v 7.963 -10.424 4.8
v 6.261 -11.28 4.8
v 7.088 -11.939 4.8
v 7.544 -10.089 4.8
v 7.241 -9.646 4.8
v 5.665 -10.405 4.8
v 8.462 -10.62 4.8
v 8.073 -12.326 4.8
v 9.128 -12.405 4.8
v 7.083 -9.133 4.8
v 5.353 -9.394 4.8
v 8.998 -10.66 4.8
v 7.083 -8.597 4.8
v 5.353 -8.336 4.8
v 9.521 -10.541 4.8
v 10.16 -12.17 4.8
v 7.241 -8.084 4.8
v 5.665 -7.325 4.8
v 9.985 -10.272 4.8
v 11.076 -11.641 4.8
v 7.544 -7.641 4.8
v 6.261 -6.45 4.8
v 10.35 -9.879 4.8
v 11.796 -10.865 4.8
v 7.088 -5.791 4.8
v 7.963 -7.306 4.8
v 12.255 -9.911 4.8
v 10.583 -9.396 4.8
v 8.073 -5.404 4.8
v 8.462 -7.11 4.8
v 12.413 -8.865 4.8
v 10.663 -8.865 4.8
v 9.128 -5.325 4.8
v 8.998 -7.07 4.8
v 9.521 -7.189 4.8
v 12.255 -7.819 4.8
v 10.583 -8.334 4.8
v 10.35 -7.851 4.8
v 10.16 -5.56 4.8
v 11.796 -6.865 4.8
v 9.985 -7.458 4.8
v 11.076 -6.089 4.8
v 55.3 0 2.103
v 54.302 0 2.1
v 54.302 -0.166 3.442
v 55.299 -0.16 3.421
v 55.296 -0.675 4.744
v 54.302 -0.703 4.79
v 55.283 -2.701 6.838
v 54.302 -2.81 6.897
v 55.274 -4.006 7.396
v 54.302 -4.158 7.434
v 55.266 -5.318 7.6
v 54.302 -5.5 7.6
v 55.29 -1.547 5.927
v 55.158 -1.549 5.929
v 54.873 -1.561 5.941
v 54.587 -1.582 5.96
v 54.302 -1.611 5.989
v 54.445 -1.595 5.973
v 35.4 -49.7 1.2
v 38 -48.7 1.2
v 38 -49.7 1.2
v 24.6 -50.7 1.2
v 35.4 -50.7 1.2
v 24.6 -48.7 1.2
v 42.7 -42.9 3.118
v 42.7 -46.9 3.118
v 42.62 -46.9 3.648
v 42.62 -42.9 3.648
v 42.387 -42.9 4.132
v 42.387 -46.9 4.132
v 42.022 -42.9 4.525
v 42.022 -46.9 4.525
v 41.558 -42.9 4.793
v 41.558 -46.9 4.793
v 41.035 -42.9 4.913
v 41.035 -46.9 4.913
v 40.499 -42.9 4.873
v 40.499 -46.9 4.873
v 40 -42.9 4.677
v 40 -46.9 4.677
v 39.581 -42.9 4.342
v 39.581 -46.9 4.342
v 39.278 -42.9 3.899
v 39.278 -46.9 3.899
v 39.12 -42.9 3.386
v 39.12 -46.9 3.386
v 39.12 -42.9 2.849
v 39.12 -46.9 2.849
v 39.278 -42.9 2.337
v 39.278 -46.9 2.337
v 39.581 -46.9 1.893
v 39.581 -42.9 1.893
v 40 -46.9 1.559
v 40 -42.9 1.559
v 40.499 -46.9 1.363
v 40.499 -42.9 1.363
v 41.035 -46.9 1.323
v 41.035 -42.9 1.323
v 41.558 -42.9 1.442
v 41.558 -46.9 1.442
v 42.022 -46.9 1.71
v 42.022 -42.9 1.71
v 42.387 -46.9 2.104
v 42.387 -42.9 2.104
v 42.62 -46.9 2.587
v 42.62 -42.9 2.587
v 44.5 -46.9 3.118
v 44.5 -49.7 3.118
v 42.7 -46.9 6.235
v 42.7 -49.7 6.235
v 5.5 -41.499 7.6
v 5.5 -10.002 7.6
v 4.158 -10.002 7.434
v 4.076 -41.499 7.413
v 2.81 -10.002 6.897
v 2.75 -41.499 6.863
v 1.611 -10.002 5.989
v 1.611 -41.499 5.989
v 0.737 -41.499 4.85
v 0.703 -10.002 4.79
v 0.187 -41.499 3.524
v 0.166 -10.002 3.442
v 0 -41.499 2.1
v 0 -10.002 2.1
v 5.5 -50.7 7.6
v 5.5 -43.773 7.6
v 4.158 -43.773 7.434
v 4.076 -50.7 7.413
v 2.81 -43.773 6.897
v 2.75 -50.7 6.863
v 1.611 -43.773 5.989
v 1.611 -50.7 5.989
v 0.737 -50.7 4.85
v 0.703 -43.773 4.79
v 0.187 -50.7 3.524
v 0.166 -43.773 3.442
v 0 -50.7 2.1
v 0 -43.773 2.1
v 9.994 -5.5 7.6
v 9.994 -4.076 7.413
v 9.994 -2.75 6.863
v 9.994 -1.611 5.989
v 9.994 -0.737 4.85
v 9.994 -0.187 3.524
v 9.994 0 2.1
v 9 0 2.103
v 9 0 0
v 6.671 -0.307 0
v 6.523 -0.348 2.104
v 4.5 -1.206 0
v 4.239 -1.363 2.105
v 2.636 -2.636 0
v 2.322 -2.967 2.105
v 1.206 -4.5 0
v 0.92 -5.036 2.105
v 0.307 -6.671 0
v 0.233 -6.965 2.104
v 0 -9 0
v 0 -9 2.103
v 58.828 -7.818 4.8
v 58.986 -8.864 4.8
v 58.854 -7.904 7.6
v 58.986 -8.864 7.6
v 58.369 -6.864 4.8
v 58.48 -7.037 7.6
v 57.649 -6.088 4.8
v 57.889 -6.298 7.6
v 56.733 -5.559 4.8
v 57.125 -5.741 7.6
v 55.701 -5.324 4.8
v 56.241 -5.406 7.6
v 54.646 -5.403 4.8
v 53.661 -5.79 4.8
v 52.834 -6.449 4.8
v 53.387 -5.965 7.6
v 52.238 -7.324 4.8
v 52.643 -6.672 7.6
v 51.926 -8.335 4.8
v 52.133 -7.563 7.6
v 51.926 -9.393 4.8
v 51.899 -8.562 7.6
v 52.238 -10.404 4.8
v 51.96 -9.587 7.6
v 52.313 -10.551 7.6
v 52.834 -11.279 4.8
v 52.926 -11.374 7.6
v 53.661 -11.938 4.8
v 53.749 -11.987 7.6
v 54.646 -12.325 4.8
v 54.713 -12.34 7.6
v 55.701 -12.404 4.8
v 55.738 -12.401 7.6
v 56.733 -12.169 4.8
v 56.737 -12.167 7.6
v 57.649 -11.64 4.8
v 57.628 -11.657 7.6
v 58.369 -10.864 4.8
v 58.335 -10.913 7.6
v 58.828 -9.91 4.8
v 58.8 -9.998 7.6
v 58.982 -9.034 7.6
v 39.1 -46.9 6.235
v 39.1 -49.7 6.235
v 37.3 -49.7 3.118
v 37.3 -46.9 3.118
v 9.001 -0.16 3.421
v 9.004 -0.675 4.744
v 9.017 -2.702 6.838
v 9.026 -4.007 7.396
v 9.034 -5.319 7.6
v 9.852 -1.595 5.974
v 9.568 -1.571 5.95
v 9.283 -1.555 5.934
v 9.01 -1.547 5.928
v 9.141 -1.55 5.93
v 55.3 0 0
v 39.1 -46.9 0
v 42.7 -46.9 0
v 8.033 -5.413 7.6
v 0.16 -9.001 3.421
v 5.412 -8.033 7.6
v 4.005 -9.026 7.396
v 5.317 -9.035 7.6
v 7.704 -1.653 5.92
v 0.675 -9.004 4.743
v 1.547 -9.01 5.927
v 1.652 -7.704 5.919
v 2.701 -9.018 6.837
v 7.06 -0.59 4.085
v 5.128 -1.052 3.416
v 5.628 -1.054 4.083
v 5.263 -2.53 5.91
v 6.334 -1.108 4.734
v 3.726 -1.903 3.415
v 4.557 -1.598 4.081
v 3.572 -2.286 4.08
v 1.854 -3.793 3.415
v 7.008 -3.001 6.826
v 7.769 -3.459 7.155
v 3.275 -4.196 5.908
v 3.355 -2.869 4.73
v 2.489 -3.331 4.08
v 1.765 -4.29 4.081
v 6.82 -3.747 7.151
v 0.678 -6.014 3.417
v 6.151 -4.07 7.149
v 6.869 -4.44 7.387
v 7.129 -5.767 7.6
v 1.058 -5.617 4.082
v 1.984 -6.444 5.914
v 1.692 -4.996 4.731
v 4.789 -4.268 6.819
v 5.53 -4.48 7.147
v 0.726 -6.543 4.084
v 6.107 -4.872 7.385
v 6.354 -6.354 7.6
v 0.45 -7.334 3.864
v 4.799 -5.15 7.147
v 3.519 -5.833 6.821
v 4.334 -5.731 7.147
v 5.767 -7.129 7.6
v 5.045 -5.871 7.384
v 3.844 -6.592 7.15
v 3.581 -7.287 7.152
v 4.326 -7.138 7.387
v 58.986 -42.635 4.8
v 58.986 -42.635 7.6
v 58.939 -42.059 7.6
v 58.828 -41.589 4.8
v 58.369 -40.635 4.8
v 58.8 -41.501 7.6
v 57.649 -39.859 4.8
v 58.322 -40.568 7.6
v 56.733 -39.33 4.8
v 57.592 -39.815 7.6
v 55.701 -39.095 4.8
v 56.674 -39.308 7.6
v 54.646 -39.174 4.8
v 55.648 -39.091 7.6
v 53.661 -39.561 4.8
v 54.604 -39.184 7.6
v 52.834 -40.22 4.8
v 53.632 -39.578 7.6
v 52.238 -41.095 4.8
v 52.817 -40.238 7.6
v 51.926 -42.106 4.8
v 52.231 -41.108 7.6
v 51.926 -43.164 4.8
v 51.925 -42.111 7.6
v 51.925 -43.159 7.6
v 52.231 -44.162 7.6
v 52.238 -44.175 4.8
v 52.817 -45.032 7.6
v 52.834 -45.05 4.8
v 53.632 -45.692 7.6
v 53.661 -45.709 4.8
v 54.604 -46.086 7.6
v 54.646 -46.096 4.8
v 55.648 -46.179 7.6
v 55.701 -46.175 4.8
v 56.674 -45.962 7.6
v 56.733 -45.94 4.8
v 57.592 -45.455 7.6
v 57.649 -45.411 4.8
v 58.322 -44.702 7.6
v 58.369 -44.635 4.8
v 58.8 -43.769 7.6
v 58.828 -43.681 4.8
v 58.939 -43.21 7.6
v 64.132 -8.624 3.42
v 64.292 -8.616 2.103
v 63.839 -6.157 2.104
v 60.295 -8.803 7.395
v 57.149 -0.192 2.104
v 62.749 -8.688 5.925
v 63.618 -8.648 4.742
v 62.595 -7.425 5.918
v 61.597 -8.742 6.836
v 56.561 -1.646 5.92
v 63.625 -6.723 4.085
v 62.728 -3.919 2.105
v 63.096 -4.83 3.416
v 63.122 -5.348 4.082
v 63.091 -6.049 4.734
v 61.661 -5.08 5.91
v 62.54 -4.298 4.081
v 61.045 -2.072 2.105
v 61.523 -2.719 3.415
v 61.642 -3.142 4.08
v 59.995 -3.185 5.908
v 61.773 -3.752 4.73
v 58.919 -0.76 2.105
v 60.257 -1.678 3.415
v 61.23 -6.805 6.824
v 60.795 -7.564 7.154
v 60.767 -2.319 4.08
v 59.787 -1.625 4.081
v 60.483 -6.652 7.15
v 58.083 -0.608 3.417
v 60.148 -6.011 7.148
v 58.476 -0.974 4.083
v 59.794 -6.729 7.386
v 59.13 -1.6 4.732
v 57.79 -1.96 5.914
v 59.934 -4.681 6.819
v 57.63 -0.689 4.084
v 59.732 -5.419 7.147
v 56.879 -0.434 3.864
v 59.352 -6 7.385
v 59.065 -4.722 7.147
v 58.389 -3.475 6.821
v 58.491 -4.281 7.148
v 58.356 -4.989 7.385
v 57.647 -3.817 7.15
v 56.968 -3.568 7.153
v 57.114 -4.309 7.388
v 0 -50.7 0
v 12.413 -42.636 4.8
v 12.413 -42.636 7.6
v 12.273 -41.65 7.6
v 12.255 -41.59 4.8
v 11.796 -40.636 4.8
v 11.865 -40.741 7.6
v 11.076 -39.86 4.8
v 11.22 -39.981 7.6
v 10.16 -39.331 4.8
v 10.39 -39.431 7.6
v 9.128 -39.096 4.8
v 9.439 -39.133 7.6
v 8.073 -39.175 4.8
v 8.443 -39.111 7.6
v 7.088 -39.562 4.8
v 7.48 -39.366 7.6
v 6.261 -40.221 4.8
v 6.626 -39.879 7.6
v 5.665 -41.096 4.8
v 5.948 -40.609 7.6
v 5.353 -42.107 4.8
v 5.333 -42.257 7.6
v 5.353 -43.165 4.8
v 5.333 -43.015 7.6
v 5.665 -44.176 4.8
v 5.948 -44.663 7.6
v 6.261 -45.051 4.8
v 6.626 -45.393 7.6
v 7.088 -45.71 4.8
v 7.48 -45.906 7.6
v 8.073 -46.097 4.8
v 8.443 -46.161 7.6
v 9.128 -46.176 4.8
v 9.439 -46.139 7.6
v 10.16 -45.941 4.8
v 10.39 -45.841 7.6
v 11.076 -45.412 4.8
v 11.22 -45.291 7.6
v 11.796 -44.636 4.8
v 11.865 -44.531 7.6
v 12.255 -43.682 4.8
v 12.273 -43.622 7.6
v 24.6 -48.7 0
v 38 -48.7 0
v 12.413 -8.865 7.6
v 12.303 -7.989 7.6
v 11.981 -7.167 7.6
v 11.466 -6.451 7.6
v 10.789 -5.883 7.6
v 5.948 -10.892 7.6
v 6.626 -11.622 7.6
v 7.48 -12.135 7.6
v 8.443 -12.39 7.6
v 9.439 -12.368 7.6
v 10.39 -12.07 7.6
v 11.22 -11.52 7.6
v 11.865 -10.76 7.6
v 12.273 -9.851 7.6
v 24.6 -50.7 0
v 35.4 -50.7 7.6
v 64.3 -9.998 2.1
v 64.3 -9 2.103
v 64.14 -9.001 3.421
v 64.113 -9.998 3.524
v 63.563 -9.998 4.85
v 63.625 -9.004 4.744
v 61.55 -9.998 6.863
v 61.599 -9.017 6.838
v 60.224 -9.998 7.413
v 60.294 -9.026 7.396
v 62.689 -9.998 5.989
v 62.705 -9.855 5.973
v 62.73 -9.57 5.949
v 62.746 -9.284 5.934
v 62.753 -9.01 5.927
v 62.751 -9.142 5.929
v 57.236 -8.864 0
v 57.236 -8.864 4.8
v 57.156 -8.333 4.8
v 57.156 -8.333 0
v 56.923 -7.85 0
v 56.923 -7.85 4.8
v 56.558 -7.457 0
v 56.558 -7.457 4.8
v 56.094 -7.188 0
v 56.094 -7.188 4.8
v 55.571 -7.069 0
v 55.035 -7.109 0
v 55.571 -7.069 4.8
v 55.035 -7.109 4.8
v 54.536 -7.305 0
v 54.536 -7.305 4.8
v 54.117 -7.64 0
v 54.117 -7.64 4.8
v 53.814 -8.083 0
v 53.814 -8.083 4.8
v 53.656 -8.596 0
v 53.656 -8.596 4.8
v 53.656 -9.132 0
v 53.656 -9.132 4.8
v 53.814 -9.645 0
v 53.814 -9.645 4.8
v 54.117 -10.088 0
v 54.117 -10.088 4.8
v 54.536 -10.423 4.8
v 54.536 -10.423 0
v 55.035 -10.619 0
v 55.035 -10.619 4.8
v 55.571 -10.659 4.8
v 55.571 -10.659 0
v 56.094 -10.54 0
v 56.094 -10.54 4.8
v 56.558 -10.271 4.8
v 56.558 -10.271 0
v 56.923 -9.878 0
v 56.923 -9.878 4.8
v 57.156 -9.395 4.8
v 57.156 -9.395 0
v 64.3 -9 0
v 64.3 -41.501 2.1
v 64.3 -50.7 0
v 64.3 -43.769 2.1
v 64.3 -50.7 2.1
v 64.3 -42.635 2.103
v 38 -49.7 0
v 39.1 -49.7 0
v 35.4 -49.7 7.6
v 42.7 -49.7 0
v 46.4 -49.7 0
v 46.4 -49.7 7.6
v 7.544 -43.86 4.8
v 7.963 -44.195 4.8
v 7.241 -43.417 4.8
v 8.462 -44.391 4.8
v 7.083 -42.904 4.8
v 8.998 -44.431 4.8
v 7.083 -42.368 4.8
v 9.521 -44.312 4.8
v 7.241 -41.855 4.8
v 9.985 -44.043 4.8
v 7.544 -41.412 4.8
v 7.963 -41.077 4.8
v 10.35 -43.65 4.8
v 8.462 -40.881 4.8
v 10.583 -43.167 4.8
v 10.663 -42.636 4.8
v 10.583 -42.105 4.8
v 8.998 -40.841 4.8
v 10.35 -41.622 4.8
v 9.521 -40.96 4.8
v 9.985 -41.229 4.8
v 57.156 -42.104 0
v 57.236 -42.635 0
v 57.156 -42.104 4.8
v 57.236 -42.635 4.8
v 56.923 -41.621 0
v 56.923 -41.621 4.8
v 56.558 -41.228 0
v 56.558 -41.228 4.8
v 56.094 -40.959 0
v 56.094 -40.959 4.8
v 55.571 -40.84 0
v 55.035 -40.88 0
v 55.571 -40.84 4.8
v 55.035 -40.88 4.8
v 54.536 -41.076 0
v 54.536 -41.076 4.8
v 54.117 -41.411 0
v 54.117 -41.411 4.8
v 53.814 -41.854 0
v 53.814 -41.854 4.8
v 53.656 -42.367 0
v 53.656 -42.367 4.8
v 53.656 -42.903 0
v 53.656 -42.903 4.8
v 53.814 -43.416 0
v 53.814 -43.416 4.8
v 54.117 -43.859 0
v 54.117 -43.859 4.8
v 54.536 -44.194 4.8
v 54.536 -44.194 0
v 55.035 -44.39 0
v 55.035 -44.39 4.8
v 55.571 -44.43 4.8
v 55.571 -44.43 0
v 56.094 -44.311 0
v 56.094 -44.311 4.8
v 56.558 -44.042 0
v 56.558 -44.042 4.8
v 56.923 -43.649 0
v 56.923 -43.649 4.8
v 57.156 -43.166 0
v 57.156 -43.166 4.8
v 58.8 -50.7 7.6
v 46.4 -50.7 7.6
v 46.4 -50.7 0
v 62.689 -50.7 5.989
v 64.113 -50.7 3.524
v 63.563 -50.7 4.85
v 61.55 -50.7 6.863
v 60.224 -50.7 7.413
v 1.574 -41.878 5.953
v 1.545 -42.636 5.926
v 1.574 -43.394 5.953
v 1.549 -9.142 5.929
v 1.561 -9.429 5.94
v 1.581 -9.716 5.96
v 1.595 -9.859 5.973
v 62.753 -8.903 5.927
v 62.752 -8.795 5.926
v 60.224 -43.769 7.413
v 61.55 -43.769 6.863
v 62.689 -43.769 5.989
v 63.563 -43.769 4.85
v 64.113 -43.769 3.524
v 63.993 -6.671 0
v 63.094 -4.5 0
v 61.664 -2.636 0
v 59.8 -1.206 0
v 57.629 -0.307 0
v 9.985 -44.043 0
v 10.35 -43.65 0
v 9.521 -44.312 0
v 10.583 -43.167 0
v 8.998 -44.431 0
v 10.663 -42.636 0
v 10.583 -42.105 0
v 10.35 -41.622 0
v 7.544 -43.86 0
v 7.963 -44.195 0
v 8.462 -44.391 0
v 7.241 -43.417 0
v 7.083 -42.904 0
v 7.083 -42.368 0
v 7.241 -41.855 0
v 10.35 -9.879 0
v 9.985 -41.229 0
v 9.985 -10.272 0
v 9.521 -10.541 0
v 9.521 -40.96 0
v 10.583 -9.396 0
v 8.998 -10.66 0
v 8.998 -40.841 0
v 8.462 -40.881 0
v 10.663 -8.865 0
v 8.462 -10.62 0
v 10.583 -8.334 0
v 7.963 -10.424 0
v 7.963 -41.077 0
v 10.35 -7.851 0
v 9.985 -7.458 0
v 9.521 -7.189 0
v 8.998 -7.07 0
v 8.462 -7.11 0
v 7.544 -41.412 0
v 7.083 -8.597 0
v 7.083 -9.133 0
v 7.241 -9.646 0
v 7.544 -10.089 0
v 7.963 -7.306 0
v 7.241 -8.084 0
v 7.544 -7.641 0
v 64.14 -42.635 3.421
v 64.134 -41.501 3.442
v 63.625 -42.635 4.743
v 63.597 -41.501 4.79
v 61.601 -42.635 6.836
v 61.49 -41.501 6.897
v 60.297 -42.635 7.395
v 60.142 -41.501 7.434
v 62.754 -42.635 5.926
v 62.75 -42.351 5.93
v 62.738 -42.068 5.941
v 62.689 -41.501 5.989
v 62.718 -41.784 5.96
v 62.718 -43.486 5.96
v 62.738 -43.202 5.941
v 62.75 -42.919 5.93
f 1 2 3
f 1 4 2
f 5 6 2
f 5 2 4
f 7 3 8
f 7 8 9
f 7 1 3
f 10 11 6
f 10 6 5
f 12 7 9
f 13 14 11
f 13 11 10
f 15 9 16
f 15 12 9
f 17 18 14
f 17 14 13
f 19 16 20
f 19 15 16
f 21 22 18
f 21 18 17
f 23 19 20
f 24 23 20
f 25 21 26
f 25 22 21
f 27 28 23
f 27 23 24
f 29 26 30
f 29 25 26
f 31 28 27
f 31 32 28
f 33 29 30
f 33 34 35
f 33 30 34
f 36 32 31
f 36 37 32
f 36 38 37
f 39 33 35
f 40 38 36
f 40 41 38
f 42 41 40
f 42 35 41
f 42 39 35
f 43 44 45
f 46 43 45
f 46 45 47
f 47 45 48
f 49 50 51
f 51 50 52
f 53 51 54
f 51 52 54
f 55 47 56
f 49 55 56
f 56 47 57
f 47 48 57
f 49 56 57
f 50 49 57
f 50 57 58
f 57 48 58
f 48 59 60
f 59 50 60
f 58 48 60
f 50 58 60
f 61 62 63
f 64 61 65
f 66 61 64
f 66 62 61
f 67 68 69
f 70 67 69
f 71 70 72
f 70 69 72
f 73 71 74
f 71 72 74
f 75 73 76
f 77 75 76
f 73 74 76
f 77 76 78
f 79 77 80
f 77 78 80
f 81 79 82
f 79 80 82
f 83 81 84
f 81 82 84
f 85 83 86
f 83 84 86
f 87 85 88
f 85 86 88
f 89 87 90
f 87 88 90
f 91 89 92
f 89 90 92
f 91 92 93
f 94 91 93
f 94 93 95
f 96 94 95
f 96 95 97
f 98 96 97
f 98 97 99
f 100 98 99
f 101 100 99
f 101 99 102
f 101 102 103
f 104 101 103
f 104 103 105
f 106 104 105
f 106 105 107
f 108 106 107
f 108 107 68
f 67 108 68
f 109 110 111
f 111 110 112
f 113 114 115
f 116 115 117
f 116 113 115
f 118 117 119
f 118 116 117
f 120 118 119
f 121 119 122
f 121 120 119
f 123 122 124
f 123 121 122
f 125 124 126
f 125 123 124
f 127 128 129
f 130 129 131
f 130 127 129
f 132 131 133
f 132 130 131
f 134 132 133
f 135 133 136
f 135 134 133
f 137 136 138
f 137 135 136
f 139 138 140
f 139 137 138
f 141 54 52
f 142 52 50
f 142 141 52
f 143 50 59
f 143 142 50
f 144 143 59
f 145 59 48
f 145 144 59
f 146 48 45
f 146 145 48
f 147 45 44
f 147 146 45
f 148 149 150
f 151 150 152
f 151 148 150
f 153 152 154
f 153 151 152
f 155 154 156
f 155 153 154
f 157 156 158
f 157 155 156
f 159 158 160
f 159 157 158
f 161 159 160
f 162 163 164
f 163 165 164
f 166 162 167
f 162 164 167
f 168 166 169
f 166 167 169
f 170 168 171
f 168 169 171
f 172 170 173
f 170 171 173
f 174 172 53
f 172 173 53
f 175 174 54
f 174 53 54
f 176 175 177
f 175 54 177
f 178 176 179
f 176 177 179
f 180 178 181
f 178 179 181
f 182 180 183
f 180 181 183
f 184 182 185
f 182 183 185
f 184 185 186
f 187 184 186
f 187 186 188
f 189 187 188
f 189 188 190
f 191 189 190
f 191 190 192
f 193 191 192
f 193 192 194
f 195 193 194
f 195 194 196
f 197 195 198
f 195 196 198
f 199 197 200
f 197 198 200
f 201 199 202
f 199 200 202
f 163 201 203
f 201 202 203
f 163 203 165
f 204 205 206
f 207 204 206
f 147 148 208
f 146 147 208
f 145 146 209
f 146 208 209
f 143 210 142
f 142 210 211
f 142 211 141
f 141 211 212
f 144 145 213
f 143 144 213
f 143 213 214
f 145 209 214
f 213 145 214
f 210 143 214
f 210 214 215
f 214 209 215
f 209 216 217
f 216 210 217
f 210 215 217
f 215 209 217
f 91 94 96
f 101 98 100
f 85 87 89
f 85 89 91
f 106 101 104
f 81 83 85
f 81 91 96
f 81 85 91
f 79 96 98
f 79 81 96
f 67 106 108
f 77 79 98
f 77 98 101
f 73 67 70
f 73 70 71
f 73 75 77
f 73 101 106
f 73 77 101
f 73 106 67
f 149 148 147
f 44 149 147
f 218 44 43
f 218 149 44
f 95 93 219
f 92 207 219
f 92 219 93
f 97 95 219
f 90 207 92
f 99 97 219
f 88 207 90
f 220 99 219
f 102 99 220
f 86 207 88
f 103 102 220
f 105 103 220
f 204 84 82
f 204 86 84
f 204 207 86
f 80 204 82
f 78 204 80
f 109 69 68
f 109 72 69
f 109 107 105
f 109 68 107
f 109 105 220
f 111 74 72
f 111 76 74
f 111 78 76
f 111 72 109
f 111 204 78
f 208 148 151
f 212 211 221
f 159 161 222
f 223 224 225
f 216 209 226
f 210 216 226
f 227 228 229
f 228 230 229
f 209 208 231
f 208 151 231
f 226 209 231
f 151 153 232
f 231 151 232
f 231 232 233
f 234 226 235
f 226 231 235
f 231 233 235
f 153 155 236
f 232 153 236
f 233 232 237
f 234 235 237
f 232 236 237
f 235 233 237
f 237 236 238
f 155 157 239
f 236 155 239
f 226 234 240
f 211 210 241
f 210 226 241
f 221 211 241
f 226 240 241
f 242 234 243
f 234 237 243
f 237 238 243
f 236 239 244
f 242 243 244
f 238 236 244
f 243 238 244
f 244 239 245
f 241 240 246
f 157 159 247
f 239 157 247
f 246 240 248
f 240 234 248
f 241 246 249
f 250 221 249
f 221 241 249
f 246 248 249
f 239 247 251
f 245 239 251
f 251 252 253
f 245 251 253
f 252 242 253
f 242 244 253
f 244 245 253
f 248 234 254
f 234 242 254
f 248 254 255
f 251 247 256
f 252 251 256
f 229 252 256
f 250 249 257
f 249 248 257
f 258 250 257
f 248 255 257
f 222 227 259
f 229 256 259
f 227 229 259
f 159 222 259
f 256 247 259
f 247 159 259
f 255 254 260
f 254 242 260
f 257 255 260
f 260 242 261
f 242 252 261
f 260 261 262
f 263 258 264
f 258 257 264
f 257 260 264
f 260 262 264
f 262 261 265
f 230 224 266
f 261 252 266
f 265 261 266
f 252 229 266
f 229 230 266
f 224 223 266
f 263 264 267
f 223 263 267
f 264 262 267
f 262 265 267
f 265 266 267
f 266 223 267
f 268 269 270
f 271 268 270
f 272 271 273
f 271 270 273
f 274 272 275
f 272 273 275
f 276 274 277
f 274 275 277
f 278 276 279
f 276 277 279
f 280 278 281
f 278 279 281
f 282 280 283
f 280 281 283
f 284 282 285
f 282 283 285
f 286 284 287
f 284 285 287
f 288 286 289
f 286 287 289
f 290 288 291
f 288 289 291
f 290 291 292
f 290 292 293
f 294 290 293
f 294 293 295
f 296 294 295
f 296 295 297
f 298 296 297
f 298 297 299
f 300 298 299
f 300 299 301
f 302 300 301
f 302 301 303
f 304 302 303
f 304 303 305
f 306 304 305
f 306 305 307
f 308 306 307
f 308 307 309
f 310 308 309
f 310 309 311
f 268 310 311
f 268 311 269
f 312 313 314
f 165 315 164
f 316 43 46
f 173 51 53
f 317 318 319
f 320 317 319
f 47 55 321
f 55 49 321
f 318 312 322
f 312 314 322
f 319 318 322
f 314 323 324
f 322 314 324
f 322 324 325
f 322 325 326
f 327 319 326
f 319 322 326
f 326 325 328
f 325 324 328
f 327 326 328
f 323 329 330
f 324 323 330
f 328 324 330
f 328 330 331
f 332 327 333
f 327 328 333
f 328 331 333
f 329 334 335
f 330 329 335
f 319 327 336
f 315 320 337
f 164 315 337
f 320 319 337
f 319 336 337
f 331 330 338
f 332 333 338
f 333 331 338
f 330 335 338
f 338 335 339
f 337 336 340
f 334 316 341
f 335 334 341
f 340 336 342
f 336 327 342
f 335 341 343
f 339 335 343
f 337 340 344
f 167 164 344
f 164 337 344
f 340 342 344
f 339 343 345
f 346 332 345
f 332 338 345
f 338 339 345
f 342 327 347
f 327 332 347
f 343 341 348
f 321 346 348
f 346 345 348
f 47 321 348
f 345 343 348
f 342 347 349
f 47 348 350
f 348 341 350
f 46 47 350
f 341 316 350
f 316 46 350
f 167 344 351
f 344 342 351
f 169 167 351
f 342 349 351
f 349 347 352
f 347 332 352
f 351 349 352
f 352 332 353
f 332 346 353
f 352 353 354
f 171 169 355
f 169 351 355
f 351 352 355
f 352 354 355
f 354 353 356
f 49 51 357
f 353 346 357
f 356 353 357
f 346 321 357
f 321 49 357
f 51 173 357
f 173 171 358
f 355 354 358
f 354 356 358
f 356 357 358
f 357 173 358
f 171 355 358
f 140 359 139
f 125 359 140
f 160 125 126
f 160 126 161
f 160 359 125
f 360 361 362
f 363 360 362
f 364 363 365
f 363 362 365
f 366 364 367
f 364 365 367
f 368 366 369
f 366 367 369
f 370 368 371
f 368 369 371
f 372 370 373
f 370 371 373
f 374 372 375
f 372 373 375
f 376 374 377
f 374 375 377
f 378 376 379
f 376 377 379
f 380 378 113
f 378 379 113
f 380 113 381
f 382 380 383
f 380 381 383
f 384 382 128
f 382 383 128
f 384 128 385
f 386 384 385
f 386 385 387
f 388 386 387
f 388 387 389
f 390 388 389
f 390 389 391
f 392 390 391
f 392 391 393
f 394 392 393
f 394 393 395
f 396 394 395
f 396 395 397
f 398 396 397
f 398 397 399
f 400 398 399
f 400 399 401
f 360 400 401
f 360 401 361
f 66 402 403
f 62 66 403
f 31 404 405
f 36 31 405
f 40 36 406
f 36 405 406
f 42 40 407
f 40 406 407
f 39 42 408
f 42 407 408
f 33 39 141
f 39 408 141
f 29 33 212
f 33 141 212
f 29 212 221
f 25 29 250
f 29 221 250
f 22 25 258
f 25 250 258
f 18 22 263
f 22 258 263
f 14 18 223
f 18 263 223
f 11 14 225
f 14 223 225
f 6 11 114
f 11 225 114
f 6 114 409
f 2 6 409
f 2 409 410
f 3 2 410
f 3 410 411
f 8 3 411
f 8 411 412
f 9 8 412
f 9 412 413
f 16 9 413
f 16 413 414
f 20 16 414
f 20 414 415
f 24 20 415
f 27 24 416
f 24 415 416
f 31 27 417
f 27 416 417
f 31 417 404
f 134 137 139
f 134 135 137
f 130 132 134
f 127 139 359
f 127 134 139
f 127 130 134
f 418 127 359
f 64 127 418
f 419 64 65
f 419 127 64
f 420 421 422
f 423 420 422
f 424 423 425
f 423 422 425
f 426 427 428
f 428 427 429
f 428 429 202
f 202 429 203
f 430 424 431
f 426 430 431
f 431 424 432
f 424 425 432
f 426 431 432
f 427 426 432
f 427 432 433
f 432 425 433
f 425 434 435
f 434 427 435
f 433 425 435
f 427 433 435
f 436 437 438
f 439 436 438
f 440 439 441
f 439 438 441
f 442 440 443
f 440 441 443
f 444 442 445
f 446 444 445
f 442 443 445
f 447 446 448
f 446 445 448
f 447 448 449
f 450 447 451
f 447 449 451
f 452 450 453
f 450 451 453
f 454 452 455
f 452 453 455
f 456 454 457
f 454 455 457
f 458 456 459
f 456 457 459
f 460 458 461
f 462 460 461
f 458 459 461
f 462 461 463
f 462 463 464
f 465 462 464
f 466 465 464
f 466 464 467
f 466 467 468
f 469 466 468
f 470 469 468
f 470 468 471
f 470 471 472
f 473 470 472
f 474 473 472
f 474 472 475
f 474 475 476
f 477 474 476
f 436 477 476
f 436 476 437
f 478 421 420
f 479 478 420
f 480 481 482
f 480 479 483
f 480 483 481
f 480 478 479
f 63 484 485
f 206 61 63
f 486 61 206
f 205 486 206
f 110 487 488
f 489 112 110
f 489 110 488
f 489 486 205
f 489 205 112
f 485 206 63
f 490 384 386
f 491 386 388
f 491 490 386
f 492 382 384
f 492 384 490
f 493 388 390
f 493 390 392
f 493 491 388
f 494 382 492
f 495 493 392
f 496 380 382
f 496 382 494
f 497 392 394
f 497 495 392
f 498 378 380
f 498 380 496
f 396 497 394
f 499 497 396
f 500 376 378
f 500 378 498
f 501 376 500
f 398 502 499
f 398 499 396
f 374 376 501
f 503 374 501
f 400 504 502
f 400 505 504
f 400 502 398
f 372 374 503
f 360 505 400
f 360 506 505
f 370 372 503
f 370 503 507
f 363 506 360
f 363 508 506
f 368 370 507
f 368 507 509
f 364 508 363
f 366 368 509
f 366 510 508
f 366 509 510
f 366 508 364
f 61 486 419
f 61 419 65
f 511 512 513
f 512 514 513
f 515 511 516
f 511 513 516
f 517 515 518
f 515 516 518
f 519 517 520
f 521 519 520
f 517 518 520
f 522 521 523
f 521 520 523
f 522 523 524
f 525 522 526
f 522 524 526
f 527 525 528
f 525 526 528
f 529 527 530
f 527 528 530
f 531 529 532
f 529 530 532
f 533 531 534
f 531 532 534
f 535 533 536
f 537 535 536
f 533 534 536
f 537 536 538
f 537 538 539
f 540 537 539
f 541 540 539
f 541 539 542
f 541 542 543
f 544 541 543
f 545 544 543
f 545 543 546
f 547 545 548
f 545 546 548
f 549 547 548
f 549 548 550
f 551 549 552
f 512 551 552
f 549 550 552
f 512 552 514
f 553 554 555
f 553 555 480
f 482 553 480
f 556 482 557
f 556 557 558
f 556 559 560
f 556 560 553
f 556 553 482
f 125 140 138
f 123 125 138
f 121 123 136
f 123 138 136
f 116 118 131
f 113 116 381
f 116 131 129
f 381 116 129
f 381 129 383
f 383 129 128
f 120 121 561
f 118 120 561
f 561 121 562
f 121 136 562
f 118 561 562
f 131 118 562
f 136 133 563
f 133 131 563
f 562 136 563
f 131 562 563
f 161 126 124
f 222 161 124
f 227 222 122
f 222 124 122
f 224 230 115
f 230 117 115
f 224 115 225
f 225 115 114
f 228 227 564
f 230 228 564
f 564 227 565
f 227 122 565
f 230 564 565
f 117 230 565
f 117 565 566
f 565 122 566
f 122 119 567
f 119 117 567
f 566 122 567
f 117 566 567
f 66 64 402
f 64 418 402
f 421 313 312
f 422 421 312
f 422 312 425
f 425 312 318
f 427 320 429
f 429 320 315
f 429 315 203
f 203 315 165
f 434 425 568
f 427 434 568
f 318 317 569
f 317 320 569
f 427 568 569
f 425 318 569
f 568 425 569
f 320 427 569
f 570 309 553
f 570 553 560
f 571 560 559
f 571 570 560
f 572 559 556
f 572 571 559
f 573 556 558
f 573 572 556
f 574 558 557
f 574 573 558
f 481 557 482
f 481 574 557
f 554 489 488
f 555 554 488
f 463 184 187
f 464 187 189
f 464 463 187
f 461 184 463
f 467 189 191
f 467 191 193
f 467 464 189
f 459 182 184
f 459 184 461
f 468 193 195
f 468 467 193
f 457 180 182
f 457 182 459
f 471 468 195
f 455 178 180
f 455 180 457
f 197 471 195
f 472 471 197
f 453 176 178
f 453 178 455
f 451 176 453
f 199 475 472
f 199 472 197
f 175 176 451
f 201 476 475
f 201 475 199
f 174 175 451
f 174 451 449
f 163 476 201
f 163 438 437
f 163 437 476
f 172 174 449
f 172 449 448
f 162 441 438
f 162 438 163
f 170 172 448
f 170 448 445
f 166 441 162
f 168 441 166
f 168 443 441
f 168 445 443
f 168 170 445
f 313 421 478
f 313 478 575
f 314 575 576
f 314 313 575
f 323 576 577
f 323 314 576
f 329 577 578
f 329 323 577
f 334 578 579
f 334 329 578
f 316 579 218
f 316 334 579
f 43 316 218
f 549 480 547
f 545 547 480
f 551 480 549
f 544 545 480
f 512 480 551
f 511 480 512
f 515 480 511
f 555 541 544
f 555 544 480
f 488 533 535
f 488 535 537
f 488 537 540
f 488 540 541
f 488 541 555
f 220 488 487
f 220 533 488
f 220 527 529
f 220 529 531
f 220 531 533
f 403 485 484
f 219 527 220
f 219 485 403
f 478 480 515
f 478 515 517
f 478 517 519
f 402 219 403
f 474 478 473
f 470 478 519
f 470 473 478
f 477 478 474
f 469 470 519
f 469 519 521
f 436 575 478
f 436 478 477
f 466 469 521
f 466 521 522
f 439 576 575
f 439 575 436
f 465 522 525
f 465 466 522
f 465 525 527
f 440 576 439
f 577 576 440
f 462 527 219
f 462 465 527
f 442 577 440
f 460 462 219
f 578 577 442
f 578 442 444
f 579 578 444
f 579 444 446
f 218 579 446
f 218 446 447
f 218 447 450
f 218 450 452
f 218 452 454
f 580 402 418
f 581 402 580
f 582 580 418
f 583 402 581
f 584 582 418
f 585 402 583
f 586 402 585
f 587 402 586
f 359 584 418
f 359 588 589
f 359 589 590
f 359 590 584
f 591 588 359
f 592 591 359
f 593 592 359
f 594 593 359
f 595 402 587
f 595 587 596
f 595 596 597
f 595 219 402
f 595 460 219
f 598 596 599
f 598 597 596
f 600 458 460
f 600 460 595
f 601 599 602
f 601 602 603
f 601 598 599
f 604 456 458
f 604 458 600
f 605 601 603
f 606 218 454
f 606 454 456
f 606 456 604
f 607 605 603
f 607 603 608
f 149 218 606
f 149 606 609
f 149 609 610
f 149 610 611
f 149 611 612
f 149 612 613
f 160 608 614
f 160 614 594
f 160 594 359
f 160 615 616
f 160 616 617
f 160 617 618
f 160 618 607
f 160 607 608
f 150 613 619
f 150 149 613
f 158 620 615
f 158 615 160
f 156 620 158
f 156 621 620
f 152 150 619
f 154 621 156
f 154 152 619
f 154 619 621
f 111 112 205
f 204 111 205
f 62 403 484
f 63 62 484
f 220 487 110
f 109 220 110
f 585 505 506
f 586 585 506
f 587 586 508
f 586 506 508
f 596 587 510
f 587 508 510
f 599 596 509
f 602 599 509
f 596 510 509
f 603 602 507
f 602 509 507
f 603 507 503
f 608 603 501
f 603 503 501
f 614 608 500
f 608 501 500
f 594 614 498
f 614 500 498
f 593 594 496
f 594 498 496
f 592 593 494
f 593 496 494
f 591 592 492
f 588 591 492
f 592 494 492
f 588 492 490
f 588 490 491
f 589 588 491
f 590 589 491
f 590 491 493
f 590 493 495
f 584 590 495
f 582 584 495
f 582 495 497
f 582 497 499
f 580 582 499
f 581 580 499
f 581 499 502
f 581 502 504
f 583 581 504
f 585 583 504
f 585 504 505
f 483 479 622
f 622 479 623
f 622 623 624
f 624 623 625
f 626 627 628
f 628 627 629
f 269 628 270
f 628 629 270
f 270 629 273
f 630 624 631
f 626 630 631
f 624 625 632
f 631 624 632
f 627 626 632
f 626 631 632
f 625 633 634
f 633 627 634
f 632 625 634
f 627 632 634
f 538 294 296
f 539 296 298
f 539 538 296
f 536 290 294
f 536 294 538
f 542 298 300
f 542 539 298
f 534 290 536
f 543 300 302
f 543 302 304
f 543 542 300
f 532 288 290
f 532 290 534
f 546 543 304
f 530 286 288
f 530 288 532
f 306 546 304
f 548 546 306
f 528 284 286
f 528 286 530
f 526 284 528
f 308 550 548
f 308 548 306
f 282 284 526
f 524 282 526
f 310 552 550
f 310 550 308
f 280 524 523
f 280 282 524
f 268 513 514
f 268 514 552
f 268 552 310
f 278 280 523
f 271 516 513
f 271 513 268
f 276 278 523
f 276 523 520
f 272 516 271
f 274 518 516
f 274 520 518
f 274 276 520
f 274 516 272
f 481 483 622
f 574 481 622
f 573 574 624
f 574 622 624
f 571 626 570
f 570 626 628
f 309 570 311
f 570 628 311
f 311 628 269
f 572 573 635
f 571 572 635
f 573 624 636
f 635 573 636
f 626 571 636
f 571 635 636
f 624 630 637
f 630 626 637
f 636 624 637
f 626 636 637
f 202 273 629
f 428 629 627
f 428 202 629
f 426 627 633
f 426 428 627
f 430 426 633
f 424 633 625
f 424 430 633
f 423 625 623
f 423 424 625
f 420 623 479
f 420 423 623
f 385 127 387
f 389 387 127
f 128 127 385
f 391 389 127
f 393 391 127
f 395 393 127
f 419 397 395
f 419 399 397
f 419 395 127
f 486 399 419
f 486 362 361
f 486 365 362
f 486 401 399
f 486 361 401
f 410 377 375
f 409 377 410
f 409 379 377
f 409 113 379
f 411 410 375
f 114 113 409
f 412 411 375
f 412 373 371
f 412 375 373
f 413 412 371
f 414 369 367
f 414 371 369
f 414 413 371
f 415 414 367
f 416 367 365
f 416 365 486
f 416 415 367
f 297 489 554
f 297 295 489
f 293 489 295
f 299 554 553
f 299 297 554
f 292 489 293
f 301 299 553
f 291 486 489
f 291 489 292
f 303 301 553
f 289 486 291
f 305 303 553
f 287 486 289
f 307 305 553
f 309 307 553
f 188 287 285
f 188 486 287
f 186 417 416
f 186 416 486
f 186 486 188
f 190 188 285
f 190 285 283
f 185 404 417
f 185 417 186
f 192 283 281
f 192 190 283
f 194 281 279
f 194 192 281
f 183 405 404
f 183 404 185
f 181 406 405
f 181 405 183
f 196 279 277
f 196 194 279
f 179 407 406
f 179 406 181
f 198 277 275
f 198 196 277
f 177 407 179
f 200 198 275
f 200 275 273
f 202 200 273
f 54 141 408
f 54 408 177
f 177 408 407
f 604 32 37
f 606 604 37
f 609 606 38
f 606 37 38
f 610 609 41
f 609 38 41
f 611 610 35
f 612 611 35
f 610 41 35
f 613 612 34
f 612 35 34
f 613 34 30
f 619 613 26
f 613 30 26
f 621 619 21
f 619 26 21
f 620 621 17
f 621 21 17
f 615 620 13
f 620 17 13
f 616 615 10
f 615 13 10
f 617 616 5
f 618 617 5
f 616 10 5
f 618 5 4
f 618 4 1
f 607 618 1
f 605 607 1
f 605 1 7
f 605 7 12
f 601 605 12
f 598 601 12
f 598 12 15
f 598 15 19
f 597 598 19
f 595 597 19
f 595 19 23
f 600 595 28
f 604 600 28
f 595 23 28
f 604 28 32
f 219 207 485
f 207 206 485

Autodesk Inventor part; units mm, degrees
ref_plane "YZ Plane" through (0, 0, 0) normal (1, 0, 0) x (0, 1, 0)
ref_plane "XZ Plane" through (0, 0, 0) normal (0, 1, 0) x (-1, 0, 0)
ref_plane "XY Plane" through (0, 0, 0) normal (0, 0, 1) x (1, 0, 0)
sketch "Эскиз1" plane through (0, 0, 0) normal (0, 0, 1) x (1, 0, 0)
  line L0 (0, 0) -> (64.3, 0)
  line L1 (64.3, 0) -> (64.3, -50.7)
  line L2 (64.3, -50.7) -> (0, -50.7)
  line L3 (0, -50.7) -> (0, 0)
  dimension "d0" = 64.3
  dimension "d1" = 50.7
extrude "Выдавливание1" add sketch "Эскиз1" along normal blind 7.6
sketch "Эскиз2" plane through (0, -50.7, 0) normal (0, -1, 0) x (1, 0, 0)
  line L0 (0, 0) -> (64.3, 0) projected
  line L1 (0, 0) -> (32.15, 0)
  line L2 (32.15, 0) -> (33.95, 0)
  line L3 (33.95, 0) -> (35.75, 3.1177)
  line L4 (35.75, 3.1177) -> (33.95, 6.2354)
  line L5 (33.95, 6.2354) -> (30.35, 6.2354)
  line L6 (30.35, 6.2354) -> (28.55, 3.1177)
  line L7 (28.55, 3.1177) -> (30.35, 0)
  line L8 (30.35, 0) -> (32.15, 0)
  dimension "d4" = 32.15
  dimension "d5" = 1.8
  dimension "d6" = 3.6
  dimension "d7" = 120
  dimension "d8" = 3.6
  dimension "d9" = 120
extrude "Выдавливание2" cut sketch "Эскиз2" against normal blind 3.8
sketch "Эскиз3" plane through (0, -50.7, 7.6) normal (0, -1, 0) x (1, 0, 0)
  circle A0 centre (32.15, -4.4823) radius 1.8
  point P0 (0, -7.6)
  dimension "d12" = 3.6
extrude "Выдавливание3" cut sketch "Эскиз3" against normal blind 6.8
sketch "Эскиз4" plane through (0, -50.7, 7.6) normal (0, -1, 0) x (1, 0, 0)
  circle A0 centre (32.15, -4.4823) radius 1.8 projected
  line L0 (32.15, -4.4823) -> (37.65, -4.4823)
  line L1 (64.3, -7.6) -> (33.95, -7.6) projected
  line L2 (0, 0) -> (64.3, 0) projected
  line L3 (37.65, -7.6) -> (26.65, -7.6)
  line L4 (26.65, -7.6) -> (26.65, 0)
  line L5 (26.65, 0) -> (37.65, 0)
  line L6 (37.65, 0) -> (37.65, -7.6)
  point P0 (0, -7.6)
  dimension "d15" = 5.5
  dimension "d16" = 11
extrude "Выдавливание4" cut sketch "Эскиз4" against normal blind 1
fillet "Сопряжение1" radius 9 2 edges at (0, 0, 3.8) (64.3, 0, 3.8)
sketch "Эскиз5" plane through (0, 0, 7.6) normal (0, 0, 1) x (1, 0, 0)
  line L0 (0, 0) -> (8.864, -0.001)
  arc A0 (9, 0) -> (0, -9) centre (9, -9) ccw projected
  line L1 (8.864, -0.001) -> (8.863, -8.865)
  circle A1 centre (8.863, -8.865) radius 1.8
  line L2 (64.3, 0) -> (55.436, 0)
  line L3 (55.3, 0) -> (9, 0) projected
  line L4 (55.436, 0) -> (55.436, -8.864)
  circle A2 centre (55.436, -8.864) radius 1.8
  dimension "d20" = 8.864
  dimension "d21" = 8.864
  dimension "d22" = 3.6
  dimension "d23" = 8.864
  dimension "d24" = 8.864
  dimension "d25" = 90
  dimension "d26" = 3.6
extrude "Выдавливание5" cut sketch "Эскиз5" against normal blind 10
sketch "Эскиз6" plane through (0, 0, 7.6) normal (0, 0, 1) x (1, 0, 0)
  circle A0 centre (8.863, -8.865) radius 1.8 projected
  line L0 (8.863, -8.865) -> (8.863, -42.636)
  circle A1 centre (8.863, -42.636) radius 1.8
  circle A2 centre (55.436, -8.864) radius 1.8 projected
  line L1 (55.436, -8.864) -> (55.436, -42.635)
  circle A3 centre (55.436, -42.635) radius 1.8
  point P0 (0, 0)
  dimension "d29" = 33.771
  dimension "d30" = 3.6
  dimension "d31" = 33.771
  dimension "d32" = 3.6
extrude "Выдавливание6" cut sketch "Эскиз6" against normal blind 10 contours A1 | A3
sketch "Эскиз7" plane through (0, 0, 7.6) normal (0, 0, 1) x (1, 0, 0)
  point P0 (0, 0)
sketch "Эскиз8" plane through (0, 0, 7.6) normal (0, 0, 1) x (1, 0, 0)
  circle A0 centre (8.863, -8.865) radius 1.8 projected
  circle A1 centre (8.863, -8.865) radius 3.55
  circle A2 centre (55.436, -8.864) radius 1.8 projected
  circle A3 centre (55.436, -8.864) radius 3.55
  circle A4 centre (55.436, -42.635) radius 1.8 projected
  circle A5 centre (55.436, -42.635) radius 3.55
  circle A6 centre (8.863, -42.636) radius 1.8 projected
  circle A7 centre (8.863, -42.636) radius 3.55
  point P0 (0, 0)
  dimension "d35" = 7.1
  dimension "d36" = 7.1
  dimension "d37" = 7.1
  dimension "d38" = 7.1
extrude "Выдавливание7" cut sketch "Эскиз8" against normal blind 2.8
fillet "Сопряжение2" radius 5.5 5 edges at (2.636, -2.636, 7.6) (32.15, 0, 7.6) (61.664, -2.636, 7.6) (64.3, -29.85, 7.6) (0, -29.85, 7.6)
sketch "Эскиз9" plane through (0, 0, 0) normal (0, 0, -1) x (-1, 0, 0)
  line L0 (0, -50.7) -> (0, -9) projected
  line L1 (0, -50.7) -> (-31.3, -50.7)
  line L2 (-26.65, -50.7) -> (0, -50.7) projected
  point P0 (0, 0)
  dimension "d42" = 31.3
sketch "Эскиз10" plane through (37.65, -50.7, 0) normal (0, -1, 0) x (1, 0, 0)
  point P0 (-37.65, 0)
sketch "Эскиз11" plane through (0, -49.7, 7.6) normal (0, -1, 0) x (1, 0, 0)
  line L0 (9, -7.6) -> (55.3, -7.6) projected
  line L1 (36.8968, -7.6) -> (28.1351, -7.6)
  line L2 (28.1351, -7.6) -> (28.1351, -0.8108)
  line L3 (28.1351, -0.8108) -> (36.8968, -0.8108)
  line L4 (36.8968, -0.8108) -> (36.8968, -7.6)
  point P0 (0, -7.6)
extrude "Выдавливание8" add sketch "Эскиз11" against normal blind 6.8
sketch "Эскиз12" plane through (37.65, -50.7, 0) normal (0, -1, 0) x (1, 0, 0)
  line L0 (0, 7.6) -> (0, 0) projected
  line L1 (26.65, 0) -> (0, 0) projected
  line L2 (0, 7.6) -> (6, 7.6)
  line L3 (6, 7.6) -> (6, 0)
  line L4 (6, 0) -> (0, 0)
  line L5 (0, 0) -> (0, 7.6)
  point P0 (-37.65, 0)
  dimension "d45" = 6
extrude "Выдавливание9" cut sketch "Эскиз12" against normal blind 1
sketch "Эскиз13" plane through (0, -49.7, 7.6) normal (0, -1, 0) x (1, 0, 0)
  line L0 (26.65, -7.6) -> (0, -7.6) projected
  line L1 (0, -7.6) -> (31.3, -7.6)
  line L2 (31.3, -7.6) -> (33.1, -7.6)
  line L3 (9, -7.6) -> (55.3, -7.6) projected
  line L4 (43.65, 0) -> (43.65, -7.6) projected
  line L5 (64.3, -7.6) -> (43.65, -7.6) projected
  line L6 (43.65, 0) -> (47.65, 0)
  line L7 (47.65, 0) -> (47.65, -7.6)
  line L8 (47.65, -7.6) -> (43.65, -7.6)
  line L9 (43.65, -7.6) -> (43.65, 0)
  dimension "d48" = 31.3
  dimension "d49" = 1.8
  dimension "d50" = 4
extrude "Выдавливание10" cut sketch "Эскиз13" along normal blind 1
sketch "Эскиз14" plane through (0, -49.7, 7.6) normal (0, -1, 0) x (1, 0, 0)
  line L0 (0, -7.6) -> (37.3, -7.6)
  line L1 (9, -7.6) -> (55.3, -7.6) projected
  line L2 (37.3, -7.6) -> (39.1, -7.6)
  line L3 (39.1, -7.6) -> (42.7, -7.6)
  line L4 (42.7, -7.6) -> (44.5, -4.4823)
  line L5 (44.5, -4.4823) -> (42.7, -1.3646)
  line L6 (42.7, -1.3646) -> (39.1, -1.3646)
  line L7 (39.1, -1.3646) -> (37.3, -4.4823)
  line L8 (37.3, -4.4823) -> (39.1, -7.6)
  dimension "d53" = 37.3
  dimension "d54" = 1.8
  dimension "d55" = 3.6
  dimension "d56" = 3.6
  dimension "d57" = 120
  dimension "d58" = 3.6
  dimension "d59" = 120
extrude "Выдавливание11" cut sketch "Эскиз14" against normal blind 2.8
sketch "Эскиз15" plane through (0, -49.7, 7.6) normal (0, -1, 0) x (1, 0, 0)
  circle A0 centre (40.9, -4.4823) radius 1.8
  point P0 (0, -7.6)
  dimension "d62" = 3.6
extrude "Выдавливание12" cut sketch "Эскиз15" against normal blind 6.8
sketch "Эскиз16" plane through (0, -49.7, 7.6) normal (0, -1, 0) x (1, 0, 0)
  circle A0 centre (40.9, -4.4823) radius 1.8 projected
  line L0 (40.9, -4.4823) -> (46.4, -4.4823)
  line L1 (47.65, -7.6) -> (47.65, 0) projected
  line L2 (46.4, -7.6) -> (47.65, -7.6)
  line L3 (47.65, -7.6) -> (47.65, 0)
  line L4 (47.65, 0) -> (46.4, 0)
  line L5 (46.4, 0) -> (46.4, -7.6)
  point P0 (0, -7.6)
  dimension "d65" = 5.5
extrude "Выдавливание13" add sketch "Эскиз16" along normal blind 1 contours L5 L4 L1 L2
sketch "Эскиз17" plane through (0, -49.7, 7.6) normal (0, -1, 0) x (1, 0, 0)
  circle A0 centre (40.9, -4.4823) radius 1.8 projected
  line L0 (40.9, -4.4823) -> (46.4, -4.4823)
  line L1 (46.4, 0) -> (46.4, -7.6) projected
  line L2 (40.9, -4.4823) -> (35.4, -4.4823)
  line L3 (26.65, -7.6) -> (26.65, 0) projected
  line L4 (26.65, 0) -> (35.4, 0)
  line L5 (35.4, 0) -> (35.4, -7.6)
  line L6 (35.4, -7.6) -> (26.65, -7.6)
  line L7 (26.65, -7.6) -> (26.65, 0)
  point P0 (0, -7.6)
  dimension "d68" = 5.5
  dimension "d69" = 5.5
extrude "Выдавливание14" add sketch "Эскиз17" along normal blind 1 contours L5 L6 L3 L4
sketch "Эскиз18" plane through (0, 0, 0) normal (0, 0, -1) x (-1, 0, 0)
  line L0 (0, -50.7) -> (-38, -50.7)
  point P0 (0, 0)
  dimension "d72" = 38
sketch "Эскиз19" plane through (0, 0, 0) normal (0, 0, -1) x (-1, 0, 0)
  line L0 (0, -50.7) -> (-38, -50.7)
  line L1 (-38, -50.7) -> (-24.6, -50.7)
  line L2 (-24.6, -50.7) -> (-24.6, -48.7)
  line L3 (-24.6, -48.7) -> (-38, -48.7)
  line L4 (-38, -48.7) -> (-38, -50.7)
  point P0 (0, 0)
  dimension "d73" = 38
  dimension "d74" = 13.4
  dimension "d75" = 2
extrude "Выдавливание15" cut sketch "Эскиз19" against normal blind 1.2
properties part number "golova 3 krushka"
